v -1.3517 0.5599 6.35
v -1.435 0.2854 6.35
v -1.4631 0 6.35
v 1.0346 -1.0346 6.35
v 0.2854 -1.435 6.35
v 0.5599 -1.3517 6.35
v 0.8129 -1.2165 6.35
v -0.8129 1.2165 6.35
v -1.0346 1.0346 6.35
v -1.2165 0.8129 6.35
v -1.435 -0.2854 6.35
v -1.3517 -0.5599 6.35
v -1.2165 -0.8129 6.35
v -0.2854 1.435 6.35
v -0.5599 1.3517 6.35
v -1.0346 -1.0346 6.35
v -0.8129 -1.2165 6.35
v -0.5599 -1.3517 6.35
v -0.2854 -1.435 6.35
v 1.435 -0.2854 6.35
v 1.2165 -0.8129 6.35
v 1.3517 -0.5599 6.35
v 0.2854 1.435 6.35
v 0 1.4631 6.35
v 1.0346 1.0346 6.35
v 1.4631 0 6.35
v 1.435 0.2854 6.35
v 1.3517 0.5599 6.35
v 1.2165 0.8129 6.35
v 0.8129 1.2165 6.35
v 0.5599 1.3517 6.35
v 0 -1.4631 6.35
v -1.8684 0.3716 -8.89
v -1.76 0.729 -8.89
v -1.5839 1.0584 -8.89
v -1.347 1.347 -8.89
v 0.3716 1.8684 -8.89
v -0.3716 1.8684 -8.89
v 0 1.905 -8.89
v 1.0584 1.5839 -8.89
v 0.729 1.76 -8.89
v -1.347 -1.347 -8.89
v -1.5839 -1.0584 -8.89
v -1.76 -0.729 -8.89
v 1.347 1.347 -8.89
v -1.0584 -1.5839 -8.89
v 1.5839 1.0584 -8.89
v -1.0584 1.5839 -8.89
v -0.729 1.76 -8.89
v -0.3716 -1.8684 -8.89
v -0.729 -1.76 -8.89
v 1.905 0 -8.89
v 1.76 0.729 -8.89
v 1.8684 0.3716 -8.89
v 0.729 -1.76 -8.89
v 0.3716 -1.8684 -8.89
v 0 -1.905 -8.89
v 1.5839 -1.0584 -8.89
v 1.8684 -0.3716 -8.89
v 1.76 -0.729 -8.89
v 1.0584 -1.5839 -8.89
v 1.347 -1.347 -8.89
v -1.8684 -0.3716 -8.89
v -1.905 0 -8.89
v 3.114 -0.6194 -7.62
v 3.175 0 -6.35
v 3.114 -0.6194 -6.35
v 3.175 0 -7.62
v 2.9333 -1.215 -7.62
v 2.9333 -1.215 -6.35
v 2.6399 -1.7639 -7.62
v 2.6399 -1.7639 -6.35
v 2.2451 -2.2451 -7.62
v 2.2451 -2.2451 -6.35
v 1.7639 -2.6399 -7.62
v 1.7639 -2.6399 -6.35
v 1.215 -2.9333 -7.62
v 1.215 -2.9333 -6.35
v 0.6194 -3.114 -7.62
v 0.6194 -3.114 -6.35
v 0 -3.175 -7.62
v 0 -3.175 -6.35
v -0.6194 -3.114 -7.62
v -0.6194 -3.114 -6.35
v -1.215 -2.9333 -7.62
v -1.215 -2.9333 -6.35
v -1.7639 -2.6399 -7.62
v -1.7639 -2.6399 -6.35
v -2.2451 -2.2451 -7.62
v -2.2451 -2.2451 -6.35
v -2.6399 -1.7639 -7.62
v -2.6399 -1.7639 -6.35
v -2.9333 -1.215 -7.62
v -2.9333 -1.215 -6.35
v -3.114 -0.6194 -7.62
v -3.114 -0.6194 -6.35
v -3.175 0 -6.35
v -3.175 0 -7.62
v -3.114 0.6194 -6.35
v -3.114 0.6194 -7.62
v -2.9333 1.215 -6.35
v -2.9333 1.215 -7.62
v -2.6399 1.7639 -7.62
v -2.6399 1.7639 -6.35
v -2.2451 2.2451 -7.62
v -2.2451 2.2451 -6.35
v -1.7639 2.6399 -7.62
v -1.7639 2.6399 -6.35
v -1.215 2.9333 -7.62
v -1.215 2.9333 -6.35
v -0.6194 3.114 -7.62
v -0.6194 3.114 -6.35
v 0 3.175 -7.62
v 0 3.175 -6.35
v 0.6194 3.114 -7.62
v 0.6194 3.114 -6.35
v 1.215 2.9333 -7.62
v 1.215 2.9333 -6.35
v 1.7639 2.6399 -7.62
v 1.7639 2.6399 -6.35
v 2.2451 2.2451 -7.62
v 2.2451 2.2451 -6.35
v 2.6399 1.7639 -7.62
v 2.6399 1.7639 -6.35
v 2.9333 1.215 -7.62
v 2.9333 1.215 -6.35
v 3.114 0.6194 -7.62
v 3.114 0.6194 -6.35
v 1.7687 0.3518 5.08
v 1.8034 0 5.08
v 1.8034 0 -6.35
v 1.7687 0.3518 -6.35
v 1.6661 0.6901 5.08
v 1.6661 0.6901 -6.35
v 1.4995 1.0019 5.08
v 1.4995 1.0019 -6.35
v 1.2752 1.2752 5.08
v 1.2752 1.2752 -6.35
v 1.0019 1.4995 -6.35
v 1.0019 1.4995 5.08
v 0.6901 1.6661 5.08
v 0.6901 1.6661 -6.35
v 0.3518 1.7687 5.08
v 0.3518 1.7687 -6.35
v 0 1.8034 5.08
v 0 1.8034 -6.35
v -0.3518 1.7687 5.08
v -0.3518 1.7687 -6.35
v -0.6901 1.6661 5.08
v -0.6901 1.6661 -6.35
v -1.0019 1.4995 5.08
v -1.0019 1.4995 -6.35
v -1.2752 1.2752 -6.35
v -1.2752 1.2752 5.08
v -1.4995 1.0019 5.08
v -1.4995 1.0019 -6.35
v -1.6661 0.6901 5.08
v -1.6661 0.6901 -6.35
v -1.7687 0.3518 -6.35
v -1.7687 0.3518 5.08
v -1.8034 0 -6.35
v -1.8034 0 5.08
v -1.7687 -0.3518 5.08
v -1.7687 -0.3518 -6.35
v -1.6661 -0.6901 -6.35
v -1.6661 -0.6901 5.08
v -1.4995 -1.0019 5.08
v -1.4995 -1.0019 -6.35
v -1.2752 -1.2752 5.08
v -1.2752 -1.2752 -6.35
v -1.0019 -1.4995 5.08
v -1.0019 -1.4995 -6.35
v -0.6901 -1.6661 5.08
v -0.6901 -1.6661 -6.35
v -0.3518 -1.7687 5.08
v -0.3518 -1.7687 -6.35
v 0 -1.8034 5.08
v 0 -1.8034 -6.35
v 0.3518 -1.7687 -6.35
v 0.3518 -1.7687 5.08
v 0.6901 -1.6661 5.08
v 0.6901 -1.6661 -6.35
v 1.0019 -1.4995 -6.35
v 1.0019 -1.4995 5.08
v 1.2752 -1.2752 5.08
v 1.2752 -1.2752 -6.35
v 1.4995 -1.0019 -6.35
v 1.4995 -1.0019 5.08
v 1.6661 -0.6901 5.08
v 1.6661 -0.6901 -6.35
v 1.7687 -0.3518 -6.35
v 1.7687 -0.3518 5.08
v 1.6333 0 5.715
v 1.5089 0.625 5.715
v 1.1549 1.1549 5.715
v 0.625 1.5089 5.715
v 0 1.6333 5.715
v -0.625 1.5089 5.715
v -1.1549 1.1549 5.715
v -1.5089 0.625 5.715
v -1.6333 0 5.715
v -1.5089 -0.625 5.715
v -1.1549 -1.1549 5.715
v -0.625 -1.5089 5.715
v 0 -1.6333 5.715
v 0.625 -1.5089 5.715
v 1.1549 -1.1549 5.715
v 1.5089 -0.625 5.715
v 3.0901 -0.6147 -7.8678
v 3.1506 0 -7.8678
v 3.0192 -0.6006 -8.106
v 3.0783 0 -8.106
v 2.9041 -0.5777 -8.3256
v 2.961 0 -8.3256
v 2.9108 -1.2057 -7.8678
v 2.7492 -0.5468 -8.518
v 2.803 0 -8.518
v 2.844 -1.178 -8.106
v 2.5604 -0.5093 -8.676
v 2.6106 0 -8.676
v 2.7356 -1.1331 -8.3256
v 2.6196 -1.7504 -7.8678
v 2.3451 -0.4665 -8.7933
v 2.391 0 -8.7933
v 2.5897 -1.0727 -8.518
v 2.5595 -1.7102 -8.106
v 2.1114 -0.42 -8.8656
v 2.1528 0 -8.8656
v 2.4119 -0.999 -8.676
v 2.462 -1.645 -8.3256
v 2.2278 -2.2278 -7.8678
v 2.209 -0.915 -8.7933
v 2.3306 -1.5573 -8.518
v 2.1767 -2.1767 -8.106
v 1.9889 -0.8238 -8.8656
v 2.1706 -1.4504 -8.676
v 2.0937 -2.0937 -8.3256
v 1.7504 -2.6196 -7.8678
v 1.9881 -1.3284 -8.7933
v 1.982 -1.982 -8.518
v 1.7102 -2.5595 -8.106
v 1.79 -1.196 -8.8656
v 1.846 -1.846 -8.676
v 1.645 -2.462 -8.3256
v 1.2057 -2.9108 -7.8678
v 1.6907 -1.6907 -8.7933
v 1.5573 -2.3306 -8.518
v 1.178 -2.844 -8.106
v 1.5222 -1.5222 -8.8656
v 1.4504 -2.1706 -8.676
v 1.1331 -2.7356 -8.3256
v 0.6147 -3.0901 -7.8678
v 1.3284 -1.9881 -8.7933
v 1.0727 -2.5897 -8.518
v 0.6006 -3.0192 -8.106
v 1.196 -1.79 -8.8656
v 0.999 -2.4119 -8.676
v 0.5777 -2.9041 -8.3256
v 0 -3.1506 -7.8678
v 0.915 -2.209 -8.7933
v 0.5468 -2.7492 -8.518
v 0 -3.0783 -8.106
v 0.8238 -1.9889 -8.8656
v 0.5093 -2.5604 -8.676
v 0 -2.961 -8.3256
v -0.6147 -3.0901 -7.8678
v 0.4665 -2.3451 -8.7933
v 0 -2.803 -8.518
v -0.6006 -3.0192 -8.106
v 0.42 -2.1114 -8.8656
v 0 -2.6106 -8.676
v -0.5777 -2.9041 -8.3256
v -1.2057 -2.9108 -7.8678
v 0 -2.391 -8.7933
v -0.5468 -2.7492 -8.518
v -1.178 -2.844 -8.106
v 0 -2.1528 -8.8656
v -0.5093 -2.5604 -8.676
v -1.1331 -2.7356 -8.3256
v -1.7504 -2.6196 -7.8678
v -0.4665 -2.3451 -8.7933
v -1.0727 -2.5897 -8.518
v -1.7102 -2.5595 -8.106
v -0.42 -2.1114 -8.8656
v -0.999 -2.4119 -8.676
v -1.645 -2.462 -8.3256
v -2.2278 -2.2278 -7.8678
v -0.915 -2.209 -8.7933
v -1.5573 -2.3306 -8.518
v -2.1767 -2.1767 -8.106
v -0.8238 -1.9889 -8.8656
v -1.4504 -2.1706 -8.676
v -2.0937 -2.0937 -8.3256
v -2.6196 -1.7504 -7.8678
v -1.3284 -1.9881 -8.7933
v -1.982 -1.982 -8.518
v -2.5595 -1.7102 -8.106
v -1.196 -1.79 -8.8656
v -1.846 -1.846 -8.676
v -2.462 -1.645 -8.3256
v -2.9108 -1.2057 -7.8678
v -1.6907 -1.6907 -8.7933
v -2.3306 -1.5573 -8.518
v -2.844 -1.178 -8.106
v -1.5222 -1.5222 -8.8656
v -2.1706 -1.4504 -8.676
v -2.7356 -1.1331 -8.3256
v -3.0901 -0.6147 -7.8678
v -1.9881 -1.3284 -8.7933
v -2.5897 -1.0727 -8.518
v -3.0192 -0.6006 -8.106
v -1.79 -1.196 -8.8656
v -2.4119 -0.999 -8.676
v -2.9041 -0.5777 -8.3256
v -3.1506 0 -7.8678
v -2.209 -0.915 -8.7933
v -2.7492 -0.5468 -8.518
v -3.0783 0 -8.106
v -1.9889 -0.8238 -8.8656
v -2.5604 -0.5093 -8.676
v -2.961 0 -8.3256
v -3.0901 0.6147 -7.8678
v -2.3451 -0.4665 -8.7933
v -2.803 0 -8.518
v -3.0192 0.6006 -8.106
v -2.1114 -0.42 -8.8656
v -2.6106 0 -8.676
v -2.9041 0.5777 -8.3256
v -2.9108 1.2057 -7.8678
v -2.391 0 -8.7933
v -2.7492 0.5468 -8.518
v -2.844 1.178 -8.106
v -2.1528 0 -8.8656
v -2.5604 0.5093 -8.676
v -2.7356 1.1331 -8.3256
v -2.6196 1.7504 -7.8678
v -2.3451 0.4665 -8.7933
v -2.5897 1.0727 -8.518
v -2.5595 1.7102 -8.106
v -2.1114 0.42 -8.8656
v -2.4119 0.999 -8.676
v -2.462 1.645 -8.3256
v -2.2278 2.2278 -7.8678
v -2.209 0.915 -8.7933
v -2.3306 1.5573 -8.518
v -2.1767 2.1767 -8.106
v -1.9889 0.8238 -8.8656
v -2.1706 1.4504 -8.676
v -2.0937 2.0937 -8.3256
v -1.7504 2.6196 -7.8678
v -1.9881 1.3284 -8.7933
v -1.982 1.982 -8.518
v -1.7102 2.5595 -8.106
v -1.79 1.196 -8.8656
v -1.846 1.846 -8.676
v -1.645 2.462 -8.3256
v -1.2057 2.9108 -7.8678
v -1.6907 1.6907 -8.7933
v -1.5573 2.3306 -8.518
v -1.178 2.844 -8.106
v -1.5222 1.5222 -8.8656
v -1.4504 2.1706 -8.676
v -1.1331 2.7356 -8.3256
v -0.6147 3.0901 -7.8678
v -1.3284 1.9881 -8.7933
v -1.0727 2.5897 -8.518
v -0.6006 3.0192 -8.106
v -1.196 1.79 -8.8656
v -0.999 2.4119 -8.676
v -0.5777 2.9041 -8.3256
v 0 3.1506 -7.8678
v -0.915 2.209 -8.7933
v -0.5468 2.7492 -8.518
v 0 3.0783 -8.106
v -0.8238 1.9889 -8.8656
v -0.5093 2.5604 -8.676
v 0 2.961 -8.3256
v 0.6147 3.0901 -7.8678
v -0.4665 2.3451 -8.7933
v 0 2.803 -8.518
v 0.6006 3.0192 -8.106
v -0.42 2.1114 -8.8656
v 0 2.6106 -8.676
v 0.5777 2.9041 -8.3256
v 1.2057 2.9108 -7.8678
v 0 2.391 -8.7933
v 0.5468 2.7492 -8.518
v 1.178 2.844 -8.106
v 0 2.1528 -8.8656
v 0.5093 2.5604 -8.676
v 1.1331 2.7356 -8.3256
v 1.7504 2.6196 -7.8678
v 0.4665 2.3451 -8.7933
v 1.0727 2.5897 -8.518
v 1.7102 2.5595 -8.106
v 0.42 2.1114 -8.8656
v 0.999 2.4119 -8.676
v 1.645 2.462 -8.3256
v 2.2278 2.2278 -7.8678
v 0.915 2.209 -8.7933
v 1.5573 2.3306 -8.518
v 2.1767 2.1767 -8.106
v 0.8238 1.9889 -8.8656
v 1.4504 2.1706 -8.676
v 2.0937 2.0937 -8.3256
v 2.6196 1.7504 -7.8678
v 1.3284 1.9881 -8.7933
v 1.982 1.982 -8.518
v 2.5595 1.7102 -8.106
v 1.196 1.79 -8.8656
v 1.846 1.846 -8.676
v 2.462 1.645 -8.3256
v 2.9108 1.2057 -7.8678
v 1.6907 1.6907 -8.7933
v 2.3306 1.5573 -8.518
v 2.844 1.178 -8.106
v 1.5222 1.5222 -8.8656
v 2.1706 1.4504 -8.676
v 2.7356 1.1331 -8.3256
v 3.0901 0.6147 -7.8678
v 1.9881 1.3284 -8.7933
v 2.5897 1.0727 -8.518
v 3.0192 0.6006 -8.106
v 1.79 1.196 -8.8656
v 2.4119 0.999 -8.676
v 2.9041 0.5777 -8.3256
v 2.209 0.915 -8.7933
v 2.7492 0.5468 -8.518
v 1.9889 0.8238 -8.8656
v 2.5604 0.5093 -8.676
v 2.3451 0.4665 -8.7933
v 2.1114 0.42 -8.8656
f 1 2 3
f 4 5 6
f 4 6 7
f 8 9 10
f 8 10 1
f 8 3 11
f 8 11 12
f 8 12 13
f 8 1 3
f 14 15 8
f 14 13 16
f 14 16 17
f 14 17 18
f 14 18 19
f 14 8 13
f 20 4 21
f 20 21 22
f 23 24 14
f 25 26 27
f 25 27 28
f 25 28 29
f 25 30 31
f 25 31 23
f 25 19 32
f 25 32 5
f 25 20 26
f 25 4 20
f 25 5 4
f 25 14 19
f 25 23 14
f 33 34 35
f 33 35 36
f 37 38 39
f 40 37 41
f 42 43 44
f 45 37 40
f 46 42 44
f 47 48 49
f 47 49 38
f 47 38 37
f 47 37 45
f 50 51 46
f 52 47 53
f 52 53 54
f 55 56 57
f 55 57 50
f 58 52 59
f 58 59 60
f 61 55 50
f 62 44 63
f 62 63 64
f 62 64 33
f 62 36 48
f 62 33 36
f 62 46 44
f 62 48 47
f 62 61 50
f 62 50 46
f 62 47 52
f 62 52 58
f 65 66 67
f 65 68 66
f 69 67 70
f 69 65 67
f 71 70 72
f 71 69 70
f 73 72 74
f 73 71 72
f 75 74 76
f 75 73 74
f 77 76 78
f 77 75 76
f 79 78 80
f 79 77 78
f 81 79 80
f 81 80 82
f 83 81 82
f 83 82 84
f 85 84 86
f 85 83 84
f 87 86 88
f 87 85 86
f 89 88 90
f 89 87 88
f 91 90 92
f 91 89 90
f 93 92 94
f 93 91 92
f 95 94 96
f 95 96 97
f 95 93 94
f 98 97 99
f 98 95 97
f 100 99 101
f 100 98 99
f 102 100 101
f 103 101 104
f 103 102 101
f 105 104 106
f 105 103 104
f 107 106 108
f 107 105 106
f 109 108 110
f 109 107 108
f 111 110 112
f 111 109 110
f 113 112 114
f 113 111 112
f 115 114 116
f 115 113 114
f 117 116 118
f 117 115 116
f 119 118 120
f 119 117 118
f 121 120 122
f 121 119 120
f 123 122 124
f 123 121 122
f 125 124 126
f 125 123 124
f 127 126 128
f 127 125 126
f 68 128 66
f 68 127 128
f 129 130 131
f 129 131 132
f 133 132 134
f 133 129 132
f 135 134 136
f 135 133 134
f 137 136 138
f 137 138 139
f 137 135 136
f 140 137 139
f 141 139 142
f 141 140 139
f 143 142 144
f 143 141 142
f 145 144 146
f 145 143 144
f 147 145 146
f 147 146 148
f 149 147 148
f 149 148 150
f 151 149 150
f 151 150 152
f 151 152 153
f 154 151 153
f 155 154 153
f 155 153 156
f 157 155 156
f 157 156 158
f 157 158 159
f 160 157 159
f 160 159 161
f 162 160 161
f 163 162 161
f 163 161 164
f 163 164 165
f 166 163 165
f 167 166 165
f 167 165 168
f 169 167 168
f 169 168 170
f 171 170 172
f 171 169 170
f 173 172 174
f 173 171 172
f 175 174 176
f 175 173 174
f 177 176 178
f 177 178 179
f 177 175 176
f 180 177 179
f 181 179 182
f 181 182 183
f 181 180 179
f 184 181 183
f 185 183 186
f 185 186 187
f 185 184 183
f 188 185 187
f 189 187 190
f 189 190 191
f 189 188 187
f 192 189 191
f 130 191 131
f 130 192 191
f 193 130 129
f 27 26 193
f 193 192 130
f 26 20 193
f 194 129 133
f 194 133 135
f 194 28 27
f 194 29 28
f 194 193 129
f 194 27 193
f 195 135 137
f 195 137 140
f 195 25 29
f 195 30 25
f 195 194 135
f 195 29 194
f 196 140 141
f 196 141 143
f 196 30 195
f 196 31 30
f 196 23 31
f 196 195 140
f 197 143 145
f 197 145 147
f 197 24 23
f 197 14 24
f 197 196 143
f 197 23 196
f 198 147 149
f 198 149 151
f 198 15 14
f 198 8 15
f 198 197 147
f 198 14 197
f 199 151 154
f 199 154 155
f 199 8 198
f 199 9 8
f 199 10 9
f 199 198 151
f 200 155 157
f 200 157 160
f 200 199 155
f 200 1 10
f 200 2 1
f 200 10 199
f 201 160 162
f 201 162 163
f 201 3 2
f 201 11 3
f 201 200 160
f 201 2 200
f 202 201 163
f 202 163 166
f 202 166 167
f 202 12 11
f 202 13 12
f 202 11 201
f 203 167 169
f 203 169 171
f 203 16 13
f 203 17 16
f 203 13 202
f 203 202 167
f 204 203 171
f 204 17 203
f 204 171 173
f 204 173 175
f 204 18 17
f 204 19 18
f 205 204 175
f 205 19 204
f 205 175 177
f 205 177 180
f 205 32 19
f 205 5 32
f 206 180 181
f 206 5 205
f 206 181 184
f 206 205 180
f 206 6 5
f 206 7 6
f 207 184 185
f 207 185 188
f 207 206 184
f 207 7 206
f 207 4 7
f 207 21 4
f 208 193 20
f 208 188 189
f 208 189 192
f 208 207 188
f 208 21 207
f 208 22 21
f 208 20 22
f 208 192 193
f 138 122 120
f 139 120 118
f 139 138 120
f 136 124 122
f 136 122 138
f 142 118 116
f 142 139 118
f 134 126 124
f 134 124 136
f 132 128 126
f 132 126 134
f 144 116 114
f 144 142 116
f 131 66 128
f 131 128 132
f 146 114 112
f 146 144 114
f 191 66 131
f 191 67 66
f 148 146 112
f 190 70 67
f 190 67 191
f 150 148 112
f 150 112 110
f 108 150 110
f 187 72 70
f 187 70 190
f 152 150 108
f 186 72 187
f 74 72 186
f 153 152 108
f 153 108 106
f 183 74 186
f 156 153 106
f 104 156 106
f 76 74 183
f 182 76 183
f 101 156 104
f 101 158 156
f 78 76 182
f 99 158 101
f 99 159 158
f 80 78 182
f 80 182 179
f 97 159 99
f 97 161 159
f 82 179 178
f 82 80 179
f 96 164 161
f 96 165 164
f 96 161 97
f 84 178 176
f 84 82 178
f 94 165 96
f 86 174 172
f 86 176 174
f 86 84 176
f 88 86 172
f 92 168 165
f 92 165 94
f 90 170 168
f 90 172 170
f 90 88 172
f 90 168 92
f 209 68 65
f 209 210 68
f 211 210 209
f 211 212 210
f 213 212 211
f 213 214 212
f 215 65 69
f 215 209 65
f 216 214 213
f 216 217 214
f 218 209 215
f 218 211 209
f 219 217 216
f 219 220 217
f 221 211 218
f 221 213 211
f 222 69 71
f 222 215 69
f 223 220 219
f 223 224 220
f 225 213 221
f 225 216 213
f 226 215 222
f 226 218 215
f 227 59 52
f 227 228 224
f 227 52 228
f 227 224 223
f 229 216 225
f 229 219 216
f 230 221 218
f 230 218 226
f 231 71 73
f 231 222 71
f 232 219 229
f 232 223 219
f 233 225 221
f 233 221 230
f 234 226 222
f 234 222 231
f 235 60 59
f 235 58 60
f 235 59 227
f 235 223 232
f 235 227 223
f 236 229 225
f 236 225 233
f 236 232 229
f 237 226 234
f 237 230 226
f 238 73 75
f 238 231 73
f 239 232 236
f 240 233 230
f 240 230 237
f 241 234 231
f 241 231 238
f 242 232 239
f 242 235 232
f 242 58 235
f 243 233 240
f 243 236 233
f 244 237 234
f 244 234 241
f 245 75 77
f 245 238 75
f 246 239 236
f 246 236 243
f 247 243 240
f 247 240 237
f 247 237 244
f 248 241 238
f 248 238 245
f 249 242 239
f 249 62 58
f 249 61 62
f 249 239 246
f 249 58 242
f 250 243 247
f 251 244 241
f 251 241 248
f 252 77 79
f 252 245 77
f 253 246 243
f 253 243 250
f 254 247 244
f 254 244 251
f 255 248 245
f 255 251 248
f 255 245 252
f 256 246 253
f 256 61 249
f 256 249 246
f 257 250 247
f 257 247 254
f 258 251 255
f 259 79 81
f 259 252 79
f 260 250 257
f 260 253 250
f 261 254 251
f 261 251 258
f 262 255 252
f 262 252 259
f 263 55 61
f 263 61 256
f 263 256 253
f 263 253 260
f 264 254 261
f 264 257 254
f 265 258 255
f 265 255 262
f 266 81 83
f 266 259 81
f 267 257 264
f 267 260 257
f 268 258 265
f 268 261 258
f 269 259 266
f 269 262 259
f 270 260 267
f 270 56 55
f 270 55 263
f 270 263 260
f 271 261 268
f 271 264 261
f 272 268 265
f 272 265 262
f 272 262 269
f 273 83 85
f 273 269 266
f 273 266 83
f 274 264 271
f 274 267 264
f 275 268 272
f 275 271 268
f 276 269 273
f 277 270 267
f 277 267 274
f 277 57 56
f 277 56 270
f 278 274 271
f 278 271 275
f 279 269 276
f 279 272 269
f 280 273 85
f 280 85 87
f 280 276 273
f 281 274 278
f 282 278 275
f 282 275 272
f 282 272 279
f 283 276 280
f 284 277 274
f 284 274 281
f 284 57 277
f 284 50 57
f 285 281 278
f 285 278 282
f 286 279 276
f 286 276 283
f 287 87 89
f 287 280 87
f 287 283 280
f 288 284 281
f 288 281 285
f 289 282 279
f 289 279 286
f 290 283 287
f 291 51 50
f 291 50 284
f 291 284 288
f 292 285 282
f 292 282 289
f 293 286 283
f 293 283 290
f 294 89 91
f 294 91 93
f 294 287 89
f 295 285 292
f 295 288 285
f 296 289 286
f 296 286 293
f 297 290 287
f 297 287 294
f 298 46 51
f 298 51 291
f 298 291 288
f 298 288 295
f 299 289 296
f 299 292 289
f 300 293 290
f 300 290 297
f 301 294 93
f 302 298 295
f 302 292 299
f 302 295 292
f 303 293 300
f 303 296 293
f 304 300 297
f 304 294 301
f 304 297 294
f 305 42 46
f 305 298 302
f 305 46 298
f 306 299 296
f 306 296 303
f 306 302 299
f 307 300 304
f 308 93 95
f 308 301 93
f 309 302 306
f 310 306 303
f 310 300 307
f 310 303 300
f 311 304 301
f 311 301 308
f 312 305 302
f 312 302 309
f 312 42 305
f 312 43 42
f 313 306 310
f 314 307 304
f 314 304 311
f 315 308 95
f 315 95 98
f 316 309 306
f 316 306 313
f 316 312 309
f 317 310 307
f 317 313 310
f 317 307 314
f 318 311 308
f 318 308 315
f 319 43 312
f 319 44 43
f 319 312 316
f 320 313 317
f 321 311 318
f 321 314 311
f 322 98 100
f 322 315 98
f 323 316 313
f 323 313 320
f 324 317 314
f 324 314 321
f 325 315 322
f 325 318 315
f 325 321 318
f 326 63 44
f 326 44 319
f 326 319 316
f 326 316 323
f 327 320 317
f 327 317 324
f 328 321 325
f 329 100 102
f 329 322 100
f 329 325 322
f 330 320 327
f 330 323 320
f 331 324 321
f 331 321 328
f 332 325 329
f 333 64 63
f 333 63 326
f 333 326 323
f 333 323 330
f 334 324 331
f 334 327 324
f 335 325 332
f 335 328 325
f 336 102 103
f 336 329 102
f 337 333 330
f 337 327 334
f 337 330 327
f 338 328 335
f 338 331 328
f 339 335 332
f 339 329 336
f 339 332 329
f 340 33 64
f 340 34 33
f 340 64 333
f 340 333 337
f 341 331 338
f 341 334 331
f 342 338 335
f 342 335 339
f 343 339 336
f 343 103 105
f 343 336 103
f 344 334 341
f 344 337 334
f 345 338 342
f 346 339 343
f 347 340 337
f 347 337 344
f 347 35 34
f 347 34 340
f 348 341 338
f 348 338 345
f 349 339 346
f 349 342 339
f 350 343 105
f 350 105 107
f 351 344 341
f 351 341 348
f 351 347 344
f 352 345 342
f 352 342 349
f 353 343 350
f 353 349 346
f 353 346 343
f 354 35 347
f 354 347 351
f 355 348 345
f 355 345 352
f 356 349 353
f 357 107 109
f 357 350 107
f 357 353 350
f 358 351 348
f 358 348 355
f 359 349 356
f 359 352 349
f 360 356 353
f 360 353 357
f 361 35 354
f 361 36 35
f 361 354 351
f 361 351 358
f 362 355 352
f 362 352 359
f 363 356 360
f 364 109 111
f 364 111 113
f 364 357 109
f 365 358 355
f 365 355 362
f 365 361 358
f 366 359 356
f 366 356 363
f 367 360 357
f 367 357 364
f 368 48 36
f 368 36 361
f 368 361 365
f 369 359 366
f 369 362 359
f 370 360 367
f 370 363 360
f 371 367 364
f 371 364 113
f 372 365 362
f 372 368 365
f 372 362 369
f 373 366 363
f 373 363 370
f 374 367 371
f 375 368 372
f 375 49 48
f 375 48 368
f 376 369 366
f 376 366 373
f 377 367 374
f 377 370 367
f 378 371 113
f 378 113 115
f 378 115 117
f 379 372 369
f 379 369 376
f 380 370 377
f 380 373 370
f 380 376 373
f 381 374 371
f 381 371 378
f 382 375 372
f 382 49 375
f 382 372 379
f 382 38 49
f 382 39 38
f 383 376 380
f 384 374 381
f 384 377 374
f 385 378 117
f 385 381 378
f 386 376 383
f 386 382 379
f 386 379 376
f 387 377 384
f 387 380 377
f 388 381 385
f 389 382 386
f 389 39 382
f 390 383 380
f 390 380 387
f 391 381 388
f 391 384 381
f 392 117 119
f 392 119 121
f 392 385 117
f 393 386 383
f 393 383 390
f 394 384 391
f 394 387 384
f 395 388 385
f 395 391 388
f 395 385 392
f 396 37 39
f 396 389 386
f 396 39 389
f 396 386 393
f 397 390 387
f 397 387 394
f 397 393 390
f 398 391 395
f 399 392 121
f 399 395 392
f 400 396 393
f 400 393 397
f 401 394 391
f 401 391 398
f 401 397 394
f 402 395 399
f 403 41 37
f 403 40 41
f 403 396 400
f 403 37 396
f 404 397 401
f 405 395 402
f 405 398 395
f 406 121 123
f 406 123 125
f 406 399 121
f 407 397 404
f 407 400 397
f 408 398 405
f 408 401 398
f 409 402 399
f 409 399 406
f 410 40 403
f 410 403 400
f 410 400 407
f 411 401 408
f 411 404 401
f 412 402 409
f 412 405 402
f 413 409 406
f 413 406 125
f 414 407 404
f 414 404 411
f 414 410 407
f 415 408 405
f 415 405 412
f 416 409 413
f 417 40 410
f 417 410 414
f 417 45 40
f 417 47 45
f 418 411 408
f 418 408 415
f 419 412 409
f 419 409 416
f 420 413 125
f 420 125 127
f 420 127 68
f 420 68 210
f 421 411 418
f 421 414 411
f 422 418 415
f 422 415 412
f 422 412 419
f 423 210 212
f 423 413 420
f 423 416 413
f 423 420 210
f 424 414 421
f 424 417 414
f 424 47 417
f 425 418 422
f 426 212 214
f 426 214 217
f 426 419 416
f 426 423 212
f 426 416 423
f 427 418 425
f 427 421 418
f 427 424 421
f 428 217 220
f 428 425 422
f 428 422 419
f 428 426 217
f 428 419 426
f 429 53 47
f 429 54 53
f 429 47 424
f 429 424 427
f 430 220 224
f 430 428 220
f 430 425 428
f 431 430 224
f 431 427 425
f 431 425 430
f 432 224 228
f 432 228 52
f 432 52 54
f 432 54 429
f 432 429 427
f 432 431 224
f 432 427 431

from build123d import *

# Parameters (mm, degrees)
SKETCH1_R           = 1.8034
BOSS_EXTRUDE1_DEPTH = 6.35
CHAMFER1_SIZE       = 1.27
CHAMFER1_SIZE2      = 0.340295474


with BuildPart() as part:
    # Sketch1 → Boss-Extrude1 (new body, symmetric)
    with BuildSketch(Plane.XY):
        Circle(SKETCH1_R)
    extrude(amount=BOSS_EXTRUDE1_DEPTH, both=True)

    # Chamfer1
    chamfer1_edges = [part.edges().sort_by_distance(p)[0] for p in [
        (-1.8034, 0, 6.35),
    ]]
    chamfer1_side = [part.faces().sort_by_distance(p)[0] for p in [
        (-1.8034, 0, 0),
    ]]
    chamfer(chamfer1_edges, length=CHAMFER1_SIZE, length2=CHAMFER1_SIZE2, reference=chamfer1_side[0])

    # Sketch2 → Revolve1 (revolve)
    with BuildSketch(Plane(origin=(0, 0, 0), x_dir=(1, 0, 0), z_dir=(0, 1, 0))):
        with BuildLine():
            Line((0, 6.35), (3.175, 6.35))
            Line((3.175, 6.35), (3.175, 7.62))
            ThreePointArc((3.175, 7.62), (2.803025612, 8.518025612), (1.905, 8.89))
            Line((1.905, 8.89), (0, 8.89))
            Line((0, 8.89), (0, 6.35))
        make_face()
    revolve(axis=Axis((0, 0, -6.35), (0, 0, -1)))


solid = part.part
